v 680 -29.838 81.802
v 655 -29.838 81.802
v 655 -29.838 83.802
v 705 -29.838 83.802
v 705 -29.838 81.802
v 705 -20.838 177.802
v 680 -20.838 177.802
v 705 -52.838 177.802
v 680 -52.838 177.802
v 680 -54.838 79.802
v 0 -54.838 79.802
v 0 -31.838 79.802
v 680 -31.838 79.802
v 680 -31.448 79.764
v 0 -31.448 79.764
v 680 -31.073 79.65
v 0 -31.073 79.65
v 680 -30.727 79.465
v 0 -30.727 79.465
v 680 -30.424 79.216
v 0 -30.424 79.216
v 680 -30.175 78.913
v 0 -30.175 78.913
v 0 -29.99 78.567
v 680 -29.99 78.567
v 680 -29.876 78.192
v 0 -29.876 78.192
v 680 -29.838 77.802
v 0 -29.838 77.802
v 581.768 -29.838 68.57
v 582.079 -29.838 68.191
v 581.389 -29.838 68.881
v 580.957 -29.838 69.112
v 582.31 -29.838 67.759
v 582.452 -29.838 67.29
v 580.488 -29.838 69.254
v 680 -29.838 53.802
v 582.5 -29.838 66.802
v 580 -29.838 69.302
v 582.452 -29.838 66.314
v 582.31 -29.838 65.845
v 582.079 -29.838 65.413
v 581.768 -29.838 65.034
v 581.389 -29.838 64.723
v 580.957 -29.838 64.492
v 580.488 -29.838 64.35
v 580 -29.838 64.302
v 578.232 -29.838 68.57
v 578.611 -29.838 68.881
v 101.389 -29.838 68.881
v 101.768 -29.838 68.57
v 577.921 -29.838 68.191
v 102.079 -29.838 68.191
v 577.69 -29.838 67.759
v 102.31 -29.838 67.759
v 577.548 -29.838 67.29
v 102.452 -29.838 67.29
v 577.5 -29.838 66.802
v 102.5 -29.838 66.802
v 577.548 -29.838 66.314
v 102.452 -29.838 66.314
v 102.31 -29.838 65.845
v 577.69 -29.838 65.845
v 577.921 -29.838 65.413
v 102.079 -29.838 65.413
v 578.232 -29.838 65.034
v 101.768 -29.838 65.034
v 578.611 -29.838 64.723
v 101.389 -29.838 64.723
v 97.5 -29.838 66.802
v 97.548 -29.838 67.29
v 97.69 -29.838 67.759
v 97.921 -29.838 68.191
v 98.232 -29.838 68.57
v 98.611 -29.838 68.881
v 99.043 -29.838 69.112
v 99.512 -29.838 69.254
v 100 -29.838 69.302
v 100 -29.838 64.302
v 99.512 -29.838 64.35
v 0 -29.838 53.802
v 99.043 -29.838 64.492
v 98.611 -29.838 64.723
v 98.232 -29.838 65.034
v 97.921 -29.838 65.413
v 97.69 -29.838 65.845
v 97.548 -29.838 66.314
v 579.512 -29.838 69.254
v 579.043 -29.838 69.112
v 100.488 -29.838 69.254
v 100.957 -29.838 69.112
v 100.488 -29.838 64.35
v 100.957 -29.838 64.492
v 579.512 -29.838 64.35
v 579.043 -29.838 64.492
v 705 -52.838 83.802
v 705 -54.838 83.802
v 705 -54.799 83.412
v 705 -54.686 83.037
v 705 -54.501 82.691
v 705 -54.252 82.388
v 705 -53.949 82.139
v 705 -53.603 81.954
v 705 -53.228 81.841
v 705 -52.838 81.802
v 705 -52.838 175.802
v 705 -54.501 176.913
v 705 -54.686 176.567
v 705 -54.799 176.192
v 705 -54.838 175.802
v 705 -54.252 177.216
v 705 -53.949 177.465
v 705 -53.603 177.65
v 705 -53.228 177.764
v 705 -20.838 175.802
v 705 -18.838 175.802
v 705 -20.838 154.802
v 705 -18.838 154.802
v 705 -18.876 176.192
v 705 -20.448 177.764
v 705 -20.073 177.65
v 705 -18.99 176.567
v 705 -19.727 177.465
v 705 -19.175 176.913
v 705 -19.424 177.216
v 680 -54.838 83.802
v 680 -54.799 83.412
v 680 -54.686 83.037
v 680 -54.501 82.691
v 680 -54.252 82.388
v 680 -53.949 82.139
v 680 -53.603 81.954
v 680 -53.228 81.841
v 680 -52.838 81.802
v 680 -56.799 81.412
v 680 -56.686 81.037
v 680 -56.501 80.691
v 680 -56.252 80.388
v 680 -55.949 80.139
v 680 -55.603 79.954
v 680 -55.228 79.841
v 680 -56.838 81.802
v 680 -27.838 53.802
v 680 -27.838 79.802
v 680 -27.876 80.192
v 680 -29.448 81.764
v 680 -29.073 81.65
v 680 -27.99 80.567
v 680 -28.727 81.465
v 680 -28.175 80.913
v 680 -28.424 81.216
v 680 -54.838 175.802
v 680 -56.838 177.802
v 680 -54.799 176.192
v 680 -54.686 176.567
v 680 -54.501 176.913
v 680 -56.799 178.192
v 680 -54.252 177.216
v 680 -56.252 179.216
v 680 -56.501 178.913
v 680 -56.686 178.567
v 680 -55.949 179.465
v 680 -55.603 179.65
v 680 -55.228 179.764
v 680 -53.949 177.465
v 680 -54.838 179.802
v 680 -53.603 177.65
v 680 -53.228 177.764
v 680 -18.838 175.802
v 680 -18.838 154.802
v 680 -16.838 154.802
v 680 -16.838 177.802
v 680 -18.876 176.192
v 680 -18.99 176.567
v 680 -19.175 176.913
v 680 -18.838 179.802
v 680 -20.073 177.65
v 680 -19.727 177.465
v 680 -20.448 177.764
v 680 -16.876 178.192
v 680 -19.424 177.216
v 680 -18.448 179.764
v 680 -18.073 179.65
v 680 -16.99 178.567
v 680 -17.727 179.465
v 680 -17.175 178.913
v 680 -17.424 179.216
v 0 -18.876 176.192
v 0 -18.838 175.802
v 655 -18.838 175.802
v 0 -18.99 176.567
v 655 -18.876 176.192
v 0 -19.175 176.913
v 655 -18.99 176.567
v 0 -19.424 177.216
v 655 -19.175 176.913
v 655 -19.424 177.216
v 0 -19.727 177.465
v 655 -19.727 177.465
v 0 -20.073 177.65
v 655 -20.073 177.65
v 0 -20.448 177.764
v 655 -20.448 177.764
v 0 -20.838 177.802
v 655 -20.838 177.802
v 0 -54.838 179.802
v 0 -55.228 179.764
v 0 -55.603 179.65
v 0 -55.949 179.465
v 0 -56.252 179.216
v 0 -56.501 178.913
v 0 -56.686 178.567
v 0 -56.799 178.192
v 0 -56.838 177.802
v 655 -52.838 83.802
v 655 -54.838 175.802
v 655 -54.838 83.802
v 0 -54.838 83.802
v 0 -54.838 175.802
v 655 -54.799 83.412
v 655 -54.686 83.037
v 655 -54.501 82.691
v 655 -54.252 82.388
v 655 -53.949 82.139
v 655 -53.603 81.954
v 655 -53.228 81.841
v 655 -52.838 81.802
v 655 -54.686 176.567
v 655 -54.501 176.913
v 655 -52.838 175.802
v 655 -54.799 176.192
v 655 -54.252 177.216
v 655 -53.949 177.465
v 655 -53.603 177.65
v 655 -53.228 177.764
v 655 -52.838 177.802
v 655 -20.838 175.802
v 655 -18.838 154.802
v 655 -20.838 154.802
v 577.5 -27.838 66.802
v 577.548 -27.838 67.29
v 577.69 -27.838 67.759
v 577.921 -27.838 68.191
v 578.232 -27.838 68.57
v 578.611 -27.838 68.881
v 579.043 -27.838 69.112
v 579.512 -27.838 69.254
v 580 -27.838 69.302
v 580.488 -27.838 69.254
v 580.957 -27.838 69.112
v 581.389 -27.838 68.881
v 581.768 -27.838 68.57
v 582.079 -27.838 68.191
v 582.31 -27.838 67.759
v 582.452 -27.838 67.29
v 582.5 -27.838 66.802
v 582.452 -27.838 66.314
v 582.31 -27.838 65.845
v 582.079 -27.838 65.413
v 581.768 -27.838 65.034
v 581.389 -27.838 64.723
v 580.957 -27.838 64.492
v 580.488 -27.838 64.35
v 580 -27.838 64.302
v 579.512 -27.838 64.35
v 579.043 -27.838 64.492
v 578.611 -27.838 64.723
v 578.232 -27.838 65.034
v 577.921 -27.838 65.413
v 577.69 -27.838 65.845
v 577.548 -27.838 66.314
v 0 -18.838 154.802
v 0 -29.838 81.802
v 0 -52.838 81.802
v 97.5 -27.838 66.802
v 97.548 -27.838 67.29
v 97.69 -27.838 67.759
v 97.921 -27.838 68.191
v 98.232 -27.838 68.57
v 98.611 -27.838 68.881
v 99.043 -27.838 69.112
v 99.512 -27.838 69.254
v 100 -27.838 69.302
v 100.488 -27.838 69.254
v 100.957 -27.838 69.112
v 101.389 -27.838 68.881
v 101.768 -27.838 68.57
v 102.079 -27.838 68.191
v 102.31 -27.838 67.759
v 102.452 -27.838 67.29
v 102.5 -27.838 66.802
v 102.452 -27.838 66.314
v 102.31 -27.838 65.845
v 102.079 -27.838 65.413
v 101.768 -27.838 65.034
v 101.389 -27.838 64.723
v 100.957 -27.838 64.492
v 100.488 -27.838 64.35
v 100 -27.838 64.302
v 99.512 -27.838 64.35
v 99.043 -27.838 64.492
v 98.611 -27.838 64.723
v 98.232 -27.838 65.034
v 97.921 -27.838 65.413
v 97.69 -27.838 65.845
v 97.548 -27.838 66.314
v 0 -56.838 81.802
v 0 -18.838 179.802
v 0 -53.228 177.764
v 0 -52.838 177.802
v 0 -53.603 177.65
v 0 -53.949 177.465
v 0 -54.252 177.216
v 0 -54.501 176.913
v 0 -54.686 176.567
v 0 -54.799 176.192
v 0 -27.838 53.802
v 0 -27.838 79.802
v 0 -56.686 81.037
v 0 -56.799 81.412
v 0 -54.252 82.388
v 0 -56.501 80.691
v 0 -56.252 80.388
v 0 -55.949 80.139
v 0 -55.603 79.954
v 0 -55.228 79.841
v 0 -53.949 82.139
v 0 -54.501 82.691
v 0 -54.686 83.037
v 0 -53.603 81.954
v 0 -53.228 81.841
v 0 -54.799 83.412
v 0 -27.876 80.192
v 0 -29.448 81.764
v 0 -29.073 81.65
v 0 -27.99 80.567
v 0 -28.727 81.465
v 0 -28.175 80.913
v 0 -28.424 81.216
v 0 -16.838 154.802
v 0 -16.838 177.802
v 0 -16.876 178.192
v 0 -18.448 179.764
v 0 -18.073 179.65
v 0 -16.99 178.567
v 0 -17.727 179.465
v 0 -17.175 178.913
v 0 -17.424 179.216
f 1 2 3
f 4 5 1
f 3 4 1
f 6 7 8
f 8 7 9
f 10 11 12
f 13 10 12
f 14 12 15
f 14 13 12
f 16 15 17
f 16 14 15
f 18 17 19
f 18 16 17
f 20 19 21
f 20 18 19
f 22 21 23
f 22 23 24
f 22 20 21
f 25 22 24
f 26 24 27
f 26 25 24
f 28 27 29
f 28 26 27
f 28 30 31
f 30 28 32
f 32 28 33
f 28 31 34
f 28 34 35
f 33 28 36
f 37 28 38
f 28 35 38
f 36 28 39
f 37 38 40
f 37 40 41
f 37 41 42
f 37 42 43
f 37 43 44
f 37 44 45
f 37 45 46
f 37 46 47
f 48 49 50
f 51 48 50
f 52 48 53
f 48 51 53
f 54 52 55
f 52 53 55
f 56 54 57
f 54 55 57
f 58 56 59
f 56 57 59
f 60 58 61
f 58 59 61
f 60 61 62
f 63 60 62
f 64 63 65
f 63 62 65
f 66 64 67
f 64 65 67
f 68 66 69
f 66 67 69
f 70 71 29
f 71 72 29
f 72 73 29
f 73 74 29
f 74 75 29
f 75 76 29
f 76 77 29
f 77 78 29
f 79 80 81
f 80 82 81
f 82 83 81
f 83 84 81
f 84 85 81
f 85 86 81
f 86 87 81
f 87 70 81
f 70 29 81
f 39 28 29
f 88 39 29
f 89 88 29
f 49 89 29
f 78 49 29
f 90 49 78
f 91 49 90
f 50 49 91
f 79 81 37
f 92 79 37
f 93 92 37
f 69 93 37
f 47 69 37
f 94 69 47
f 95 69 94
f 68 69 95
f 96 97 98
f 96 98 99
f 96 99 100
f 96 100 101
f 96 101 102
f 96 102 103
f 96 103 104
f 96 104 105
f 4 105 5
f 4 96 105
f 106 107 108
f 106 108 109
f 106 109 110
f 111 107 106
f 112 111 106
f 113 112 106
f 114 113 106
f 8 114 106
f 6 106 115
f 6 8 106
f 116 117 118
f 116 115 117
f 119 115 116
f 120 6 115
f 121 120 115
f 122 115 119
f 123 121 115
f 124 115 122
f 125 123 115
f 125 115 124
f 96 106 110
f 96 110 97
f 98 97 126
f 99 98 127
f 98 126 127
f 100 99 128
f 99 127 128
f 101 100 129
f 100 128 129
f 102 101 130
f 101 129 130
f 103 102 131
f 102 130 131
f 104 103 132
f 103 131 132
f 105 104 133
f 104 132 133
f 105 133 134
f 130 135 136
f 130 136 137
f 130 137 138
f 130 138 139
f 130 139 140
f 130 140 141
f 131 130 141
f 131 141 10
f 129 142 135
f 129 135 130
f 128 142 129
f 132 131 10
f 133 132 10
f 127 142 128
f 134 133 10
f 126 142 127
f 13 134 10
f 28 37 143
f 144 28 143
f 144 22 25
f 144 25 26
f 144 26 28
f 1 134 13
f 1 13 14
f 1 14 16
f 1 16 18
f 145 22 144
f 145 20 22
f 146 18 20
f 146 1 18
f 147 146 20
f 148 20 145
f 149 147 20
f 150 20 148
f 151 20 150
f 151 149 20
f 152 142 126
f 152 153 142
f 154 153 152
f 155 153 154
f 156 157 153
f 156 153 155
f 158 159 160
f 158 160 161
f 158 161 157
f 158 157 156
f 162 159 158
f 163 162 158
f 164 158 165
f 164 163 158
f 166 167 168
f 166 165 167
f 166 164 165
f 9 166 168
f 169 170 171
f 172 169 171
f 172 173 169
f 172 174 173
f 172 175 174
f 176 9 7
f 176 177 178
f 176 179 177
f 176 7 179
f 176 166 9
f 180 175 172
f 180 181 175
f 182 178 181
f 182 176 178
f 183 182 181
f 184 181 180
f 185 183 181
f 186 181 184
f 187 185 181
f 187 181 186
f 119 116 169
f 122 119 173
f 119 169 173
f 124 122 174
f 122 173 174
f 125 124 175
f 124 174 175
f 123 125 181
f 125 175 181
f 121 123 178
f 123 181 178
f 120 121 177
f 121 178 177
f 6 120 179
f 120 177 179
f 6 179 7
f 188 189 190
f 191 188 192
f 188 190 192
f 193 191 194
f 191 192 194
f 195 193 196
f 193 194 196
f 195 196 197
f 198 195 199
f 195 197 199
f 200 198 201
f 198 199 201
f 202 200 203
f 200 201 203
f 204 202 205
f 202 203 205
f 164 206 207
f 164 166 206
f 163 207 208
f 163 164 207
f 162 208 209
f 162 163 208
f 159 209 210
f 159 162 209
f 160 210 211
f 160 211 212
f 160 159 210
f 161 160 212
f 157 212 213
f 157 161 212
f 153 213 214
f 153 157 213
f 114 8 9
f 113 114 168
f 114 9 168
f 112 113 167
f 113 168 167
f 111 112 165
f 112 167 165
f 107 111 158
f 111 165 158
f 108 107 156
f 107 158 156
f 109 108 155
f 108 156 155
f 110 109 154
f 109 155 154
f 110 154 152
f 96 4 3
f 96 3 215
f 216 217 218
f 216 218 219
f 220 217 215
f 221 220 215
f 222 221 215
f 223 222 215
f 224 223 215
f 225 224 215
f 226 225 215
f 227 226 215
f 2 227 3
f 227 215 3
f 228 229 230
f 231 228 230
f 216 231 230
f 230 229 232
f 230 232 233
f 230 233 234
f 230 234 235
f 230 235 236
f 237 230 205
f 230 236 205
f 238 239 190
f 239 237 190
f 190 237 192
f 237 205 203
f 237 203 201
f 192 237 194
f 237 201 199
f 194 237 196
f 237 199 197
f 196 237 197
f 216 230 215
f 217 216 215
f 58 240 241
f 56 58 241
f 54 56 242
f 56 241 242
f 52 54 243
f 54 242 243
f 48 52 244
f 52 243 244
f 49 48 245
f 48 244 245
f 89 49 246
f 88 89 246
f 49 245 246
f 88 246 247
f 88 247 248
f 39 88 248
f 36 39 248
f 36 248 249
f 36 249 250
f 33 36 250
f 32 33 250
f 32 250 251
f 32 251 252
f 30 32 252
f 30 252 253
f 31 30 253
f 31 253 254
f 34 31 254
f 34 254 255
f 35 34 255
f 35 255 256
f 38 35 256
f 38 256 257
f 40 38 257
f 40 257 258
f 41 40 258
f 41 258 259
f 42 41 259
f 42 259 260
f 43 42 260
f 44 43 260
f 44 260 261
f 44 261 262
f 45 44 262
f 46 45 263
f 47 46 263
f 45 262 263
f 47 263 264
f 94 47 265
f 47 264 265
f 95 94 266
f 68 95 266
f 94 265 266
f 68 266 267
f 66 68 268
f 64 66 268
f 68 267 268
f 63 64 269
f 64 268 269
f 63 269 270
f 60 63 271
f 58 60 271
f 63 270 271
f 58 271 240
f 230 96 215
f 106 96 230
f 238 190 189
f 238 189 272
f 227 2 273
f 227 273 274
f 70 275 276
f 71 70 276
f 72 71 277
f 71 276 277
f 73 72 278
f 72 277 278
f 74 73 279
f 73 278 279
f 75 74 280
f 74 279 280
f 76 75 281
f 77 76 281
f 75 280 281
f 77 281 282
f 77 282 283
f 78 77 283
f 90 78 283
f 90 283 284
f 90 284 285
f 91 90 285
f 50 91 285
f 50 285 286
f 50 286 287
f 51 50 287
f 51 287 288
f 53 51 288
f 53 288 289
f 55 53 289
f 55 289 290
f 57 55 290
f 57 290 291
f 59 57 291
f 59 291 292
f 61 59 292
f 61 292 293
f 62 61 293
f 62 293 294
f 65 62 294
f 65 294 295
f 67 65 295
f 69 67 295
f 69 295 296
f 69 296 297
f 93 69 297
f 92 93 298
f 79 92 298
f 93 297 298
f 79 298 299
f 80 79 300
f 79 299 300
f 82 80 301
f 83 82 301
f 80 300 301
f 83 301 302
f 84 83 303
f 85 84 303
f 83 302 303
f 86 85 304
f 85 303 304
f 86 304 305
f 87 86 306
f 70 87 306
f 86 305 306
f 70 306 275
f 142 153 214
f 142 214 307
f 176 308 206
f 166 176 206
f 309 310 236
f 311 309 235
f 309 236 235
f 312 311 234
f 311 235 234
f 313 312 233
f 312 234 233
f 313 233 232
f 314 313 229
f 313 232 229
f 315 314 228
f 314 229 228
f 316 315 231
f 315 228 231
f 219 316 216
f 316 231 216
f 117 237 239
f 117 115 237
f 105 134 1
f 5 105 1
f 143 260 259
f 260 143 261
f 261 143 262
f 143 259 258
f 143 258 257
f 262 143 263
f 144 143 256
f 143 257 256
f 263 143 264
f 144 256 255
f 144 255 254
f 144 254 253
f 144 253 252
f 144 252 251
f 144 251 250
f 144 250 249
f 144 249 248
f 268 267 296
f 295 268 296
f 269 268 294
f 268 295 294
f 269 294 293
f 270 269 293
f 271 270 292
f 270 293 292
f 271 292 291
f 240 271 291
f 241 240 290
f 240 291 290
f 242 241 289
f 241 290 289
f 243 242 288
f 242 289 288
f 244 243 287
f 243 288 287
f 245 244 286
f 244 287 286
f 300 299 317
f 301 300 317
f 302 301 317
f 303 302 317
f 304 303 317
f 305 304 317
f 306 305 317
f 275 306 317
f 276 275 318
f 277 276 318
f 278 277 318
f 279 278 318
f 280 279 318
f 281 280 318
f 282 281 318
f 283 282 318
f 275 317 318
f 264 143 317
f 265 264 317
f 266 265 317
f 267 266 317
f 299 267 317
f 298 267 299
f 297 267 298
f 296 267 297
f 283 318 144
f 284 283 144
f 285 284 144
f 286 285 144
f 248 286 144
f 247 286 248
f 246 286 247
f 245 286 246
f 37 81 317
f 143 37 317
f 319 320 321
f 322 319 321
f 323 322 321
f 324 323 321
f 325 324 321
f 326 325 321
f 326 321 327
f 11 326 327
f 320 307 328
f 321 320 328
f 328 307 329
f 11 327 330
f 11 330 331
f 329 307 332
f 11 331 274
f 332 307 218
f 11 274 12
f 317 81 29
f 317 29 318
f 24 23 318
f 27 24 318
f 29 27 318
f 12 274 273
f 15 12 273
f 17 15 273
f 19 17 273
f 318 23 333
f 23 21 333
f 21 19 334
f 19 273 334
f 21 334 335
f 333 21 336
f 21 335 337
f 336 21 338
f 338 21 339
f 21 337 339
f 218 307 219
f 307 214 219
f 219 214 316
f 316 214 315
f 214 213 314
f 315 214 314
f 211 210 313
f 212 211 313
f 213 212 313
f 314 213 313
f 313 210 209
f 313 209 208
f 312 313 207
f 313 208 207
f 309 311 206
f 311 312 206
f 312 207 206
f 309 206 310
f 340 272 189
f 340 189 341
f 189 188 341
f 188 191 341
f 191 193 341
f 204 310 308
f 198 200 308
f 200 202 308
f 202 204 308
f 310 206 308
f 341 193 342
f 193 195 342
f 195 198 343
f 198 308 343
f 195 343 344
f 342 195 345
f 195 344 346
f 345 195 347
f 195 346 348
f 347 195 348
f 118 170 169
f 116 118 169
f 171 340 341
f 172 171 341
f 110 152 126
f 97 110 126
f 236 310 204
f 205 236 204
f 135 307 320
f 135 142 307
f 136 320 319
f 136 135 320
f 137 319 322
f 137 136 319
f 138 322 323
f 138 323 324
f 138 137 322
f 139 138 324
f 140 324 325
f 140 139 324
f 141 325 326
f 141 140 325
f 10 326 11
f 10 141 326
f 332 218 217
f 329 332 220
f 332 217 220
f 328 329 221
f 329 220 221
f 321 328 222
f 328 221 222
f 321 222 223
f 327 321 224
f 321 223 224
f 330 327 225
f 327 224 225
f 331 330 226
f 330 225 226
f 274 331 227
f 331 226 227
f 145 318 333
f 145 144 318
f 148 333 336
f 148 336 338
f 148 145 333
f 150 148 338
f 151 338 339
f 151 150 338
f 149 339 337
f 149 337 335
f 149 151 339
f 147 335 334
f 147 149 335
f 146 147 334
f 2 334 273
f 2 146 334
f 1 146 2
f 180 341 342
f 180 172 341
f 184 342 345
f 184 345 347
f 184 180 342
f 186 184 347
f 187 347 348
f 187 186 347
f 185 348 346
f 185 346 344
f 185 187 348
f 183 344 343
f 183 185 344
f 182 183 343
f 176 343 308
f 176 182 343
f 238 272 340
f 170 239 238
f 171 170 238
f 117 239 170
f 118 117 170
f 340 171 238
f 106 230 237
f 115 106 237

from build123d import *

# Parameters (mm, degrees)
F1_DEPTH      = 680
F3_D          = 5
F4_R          = 2
F6_DEPTH      = 25
F6_DEPTH_BACK = 25


# Not quite as in the source:
# - a feature names something its author has since deleted; it is built from what else it names


with BuildPart() as f1:
    # F0 (on Right) → F1 (new body)
    with BuildSketch(Plane.YZ):
        Polygon((-18.8378913403, 177.8021101952), (-18.8378913403, 154.8021101952), (-16.8378913403, 154.8021101952), (-16.8378913403, 179.8021101952), (-56.8378913403, 179.8021101952), (-56.8378913403, 79.8021101952), (-29.8378913403, 79.8021101952), (-29.8378913403, 53.8021101952), (-27.8378913403, 53.8021101952), (-27.8378913403, 81.8021101952), (-54.8378913403, 81.8021101952), (-54.8378913403, 177.8021101952), align=None)
    extrude(amount=F1_DEPTH)

    # F3 (through all)
    with Locations(Plane.XZ.offset(29.8378913403)):
        with Locations((580, 66.8021101952), (100, 66.8021101952)):
            Hole(F3_D / 2)

    # F4
    f4_edges = [f1.edges().sort_by_distance(p)[0] for p in [
        (340, -56.837891, 179.80211),
        (340, -16.837891, 179.80211),
        (340, -56.837891, 79.80211),
        (340, -27.837891, 81.80211),
        (340, -54.837891, 81.80211),
        (340, -29.837891, 79.80211),
        (340, -18.837891, 177.80211),
        (340, -54.837891, 177.80211),
    ]]
    fillet(f4_edges, radius=F4_R)

    # F5 (on face) → F6 (join, two sides)
    with BuildSketch(Plane.YZ.offset(680)) as f6_sk:
        with BuildLine():
            Line((-20.8378913403, 154.8021101952), (-18.8378913403, 154.8021101952))
            Line((-18.8378913403, 154.8021101952), (-18.8378913403, 175.8021101952))
            ThreePointArc((-18.8378913403, 175.8021101952), (-19.4236777779, 177.2163237575), (-20.8378913403, 177.8021101952))
            Line((-20.8378913403, 177.8021101952), (-52.8378913403, 177.8021101952))
            ThreePointArc((-52.8378913403, 177.8021101952), (-54.2521049026, 177.2163237575), (-54.8378913403, 175.8021101952))
            Line((-54.8378913403, 175.8021101952), (-54.8378913403, 83.8021101952))
            ThreePointArc((-54.8378913403, 83.8021101952), (-54.2521049026, 82.3878966328), (-52.8378913403, 81.8021101952))
            Line((-52.8378913403, 81.8021101952), (-29.8378913403, 81.8021101952))
            Line((-29.8378913403, 81.8021101952), (-29.8378913403, 83.8021101952))
            Line((-29.8378913403, 83.8021101952), (-52.8378913403, 83.8021101952))
            Line((-52.8378913403, 83.8021101952), (-52.8378913403, 175.8021101952))
            Line((-52.8378913403, 175.8021101952), (-20.8378913403, 175.8021101952))
            Line((-20.8378913403, 175.8021101952), (-20.8378913403, 154.8021101952))
        make_face()
    extrude(amount=F6_DEPTH)
    extrude(f6_sk.sketch, amount=-F6_DEPTH_BACK)


solid = f1.part
